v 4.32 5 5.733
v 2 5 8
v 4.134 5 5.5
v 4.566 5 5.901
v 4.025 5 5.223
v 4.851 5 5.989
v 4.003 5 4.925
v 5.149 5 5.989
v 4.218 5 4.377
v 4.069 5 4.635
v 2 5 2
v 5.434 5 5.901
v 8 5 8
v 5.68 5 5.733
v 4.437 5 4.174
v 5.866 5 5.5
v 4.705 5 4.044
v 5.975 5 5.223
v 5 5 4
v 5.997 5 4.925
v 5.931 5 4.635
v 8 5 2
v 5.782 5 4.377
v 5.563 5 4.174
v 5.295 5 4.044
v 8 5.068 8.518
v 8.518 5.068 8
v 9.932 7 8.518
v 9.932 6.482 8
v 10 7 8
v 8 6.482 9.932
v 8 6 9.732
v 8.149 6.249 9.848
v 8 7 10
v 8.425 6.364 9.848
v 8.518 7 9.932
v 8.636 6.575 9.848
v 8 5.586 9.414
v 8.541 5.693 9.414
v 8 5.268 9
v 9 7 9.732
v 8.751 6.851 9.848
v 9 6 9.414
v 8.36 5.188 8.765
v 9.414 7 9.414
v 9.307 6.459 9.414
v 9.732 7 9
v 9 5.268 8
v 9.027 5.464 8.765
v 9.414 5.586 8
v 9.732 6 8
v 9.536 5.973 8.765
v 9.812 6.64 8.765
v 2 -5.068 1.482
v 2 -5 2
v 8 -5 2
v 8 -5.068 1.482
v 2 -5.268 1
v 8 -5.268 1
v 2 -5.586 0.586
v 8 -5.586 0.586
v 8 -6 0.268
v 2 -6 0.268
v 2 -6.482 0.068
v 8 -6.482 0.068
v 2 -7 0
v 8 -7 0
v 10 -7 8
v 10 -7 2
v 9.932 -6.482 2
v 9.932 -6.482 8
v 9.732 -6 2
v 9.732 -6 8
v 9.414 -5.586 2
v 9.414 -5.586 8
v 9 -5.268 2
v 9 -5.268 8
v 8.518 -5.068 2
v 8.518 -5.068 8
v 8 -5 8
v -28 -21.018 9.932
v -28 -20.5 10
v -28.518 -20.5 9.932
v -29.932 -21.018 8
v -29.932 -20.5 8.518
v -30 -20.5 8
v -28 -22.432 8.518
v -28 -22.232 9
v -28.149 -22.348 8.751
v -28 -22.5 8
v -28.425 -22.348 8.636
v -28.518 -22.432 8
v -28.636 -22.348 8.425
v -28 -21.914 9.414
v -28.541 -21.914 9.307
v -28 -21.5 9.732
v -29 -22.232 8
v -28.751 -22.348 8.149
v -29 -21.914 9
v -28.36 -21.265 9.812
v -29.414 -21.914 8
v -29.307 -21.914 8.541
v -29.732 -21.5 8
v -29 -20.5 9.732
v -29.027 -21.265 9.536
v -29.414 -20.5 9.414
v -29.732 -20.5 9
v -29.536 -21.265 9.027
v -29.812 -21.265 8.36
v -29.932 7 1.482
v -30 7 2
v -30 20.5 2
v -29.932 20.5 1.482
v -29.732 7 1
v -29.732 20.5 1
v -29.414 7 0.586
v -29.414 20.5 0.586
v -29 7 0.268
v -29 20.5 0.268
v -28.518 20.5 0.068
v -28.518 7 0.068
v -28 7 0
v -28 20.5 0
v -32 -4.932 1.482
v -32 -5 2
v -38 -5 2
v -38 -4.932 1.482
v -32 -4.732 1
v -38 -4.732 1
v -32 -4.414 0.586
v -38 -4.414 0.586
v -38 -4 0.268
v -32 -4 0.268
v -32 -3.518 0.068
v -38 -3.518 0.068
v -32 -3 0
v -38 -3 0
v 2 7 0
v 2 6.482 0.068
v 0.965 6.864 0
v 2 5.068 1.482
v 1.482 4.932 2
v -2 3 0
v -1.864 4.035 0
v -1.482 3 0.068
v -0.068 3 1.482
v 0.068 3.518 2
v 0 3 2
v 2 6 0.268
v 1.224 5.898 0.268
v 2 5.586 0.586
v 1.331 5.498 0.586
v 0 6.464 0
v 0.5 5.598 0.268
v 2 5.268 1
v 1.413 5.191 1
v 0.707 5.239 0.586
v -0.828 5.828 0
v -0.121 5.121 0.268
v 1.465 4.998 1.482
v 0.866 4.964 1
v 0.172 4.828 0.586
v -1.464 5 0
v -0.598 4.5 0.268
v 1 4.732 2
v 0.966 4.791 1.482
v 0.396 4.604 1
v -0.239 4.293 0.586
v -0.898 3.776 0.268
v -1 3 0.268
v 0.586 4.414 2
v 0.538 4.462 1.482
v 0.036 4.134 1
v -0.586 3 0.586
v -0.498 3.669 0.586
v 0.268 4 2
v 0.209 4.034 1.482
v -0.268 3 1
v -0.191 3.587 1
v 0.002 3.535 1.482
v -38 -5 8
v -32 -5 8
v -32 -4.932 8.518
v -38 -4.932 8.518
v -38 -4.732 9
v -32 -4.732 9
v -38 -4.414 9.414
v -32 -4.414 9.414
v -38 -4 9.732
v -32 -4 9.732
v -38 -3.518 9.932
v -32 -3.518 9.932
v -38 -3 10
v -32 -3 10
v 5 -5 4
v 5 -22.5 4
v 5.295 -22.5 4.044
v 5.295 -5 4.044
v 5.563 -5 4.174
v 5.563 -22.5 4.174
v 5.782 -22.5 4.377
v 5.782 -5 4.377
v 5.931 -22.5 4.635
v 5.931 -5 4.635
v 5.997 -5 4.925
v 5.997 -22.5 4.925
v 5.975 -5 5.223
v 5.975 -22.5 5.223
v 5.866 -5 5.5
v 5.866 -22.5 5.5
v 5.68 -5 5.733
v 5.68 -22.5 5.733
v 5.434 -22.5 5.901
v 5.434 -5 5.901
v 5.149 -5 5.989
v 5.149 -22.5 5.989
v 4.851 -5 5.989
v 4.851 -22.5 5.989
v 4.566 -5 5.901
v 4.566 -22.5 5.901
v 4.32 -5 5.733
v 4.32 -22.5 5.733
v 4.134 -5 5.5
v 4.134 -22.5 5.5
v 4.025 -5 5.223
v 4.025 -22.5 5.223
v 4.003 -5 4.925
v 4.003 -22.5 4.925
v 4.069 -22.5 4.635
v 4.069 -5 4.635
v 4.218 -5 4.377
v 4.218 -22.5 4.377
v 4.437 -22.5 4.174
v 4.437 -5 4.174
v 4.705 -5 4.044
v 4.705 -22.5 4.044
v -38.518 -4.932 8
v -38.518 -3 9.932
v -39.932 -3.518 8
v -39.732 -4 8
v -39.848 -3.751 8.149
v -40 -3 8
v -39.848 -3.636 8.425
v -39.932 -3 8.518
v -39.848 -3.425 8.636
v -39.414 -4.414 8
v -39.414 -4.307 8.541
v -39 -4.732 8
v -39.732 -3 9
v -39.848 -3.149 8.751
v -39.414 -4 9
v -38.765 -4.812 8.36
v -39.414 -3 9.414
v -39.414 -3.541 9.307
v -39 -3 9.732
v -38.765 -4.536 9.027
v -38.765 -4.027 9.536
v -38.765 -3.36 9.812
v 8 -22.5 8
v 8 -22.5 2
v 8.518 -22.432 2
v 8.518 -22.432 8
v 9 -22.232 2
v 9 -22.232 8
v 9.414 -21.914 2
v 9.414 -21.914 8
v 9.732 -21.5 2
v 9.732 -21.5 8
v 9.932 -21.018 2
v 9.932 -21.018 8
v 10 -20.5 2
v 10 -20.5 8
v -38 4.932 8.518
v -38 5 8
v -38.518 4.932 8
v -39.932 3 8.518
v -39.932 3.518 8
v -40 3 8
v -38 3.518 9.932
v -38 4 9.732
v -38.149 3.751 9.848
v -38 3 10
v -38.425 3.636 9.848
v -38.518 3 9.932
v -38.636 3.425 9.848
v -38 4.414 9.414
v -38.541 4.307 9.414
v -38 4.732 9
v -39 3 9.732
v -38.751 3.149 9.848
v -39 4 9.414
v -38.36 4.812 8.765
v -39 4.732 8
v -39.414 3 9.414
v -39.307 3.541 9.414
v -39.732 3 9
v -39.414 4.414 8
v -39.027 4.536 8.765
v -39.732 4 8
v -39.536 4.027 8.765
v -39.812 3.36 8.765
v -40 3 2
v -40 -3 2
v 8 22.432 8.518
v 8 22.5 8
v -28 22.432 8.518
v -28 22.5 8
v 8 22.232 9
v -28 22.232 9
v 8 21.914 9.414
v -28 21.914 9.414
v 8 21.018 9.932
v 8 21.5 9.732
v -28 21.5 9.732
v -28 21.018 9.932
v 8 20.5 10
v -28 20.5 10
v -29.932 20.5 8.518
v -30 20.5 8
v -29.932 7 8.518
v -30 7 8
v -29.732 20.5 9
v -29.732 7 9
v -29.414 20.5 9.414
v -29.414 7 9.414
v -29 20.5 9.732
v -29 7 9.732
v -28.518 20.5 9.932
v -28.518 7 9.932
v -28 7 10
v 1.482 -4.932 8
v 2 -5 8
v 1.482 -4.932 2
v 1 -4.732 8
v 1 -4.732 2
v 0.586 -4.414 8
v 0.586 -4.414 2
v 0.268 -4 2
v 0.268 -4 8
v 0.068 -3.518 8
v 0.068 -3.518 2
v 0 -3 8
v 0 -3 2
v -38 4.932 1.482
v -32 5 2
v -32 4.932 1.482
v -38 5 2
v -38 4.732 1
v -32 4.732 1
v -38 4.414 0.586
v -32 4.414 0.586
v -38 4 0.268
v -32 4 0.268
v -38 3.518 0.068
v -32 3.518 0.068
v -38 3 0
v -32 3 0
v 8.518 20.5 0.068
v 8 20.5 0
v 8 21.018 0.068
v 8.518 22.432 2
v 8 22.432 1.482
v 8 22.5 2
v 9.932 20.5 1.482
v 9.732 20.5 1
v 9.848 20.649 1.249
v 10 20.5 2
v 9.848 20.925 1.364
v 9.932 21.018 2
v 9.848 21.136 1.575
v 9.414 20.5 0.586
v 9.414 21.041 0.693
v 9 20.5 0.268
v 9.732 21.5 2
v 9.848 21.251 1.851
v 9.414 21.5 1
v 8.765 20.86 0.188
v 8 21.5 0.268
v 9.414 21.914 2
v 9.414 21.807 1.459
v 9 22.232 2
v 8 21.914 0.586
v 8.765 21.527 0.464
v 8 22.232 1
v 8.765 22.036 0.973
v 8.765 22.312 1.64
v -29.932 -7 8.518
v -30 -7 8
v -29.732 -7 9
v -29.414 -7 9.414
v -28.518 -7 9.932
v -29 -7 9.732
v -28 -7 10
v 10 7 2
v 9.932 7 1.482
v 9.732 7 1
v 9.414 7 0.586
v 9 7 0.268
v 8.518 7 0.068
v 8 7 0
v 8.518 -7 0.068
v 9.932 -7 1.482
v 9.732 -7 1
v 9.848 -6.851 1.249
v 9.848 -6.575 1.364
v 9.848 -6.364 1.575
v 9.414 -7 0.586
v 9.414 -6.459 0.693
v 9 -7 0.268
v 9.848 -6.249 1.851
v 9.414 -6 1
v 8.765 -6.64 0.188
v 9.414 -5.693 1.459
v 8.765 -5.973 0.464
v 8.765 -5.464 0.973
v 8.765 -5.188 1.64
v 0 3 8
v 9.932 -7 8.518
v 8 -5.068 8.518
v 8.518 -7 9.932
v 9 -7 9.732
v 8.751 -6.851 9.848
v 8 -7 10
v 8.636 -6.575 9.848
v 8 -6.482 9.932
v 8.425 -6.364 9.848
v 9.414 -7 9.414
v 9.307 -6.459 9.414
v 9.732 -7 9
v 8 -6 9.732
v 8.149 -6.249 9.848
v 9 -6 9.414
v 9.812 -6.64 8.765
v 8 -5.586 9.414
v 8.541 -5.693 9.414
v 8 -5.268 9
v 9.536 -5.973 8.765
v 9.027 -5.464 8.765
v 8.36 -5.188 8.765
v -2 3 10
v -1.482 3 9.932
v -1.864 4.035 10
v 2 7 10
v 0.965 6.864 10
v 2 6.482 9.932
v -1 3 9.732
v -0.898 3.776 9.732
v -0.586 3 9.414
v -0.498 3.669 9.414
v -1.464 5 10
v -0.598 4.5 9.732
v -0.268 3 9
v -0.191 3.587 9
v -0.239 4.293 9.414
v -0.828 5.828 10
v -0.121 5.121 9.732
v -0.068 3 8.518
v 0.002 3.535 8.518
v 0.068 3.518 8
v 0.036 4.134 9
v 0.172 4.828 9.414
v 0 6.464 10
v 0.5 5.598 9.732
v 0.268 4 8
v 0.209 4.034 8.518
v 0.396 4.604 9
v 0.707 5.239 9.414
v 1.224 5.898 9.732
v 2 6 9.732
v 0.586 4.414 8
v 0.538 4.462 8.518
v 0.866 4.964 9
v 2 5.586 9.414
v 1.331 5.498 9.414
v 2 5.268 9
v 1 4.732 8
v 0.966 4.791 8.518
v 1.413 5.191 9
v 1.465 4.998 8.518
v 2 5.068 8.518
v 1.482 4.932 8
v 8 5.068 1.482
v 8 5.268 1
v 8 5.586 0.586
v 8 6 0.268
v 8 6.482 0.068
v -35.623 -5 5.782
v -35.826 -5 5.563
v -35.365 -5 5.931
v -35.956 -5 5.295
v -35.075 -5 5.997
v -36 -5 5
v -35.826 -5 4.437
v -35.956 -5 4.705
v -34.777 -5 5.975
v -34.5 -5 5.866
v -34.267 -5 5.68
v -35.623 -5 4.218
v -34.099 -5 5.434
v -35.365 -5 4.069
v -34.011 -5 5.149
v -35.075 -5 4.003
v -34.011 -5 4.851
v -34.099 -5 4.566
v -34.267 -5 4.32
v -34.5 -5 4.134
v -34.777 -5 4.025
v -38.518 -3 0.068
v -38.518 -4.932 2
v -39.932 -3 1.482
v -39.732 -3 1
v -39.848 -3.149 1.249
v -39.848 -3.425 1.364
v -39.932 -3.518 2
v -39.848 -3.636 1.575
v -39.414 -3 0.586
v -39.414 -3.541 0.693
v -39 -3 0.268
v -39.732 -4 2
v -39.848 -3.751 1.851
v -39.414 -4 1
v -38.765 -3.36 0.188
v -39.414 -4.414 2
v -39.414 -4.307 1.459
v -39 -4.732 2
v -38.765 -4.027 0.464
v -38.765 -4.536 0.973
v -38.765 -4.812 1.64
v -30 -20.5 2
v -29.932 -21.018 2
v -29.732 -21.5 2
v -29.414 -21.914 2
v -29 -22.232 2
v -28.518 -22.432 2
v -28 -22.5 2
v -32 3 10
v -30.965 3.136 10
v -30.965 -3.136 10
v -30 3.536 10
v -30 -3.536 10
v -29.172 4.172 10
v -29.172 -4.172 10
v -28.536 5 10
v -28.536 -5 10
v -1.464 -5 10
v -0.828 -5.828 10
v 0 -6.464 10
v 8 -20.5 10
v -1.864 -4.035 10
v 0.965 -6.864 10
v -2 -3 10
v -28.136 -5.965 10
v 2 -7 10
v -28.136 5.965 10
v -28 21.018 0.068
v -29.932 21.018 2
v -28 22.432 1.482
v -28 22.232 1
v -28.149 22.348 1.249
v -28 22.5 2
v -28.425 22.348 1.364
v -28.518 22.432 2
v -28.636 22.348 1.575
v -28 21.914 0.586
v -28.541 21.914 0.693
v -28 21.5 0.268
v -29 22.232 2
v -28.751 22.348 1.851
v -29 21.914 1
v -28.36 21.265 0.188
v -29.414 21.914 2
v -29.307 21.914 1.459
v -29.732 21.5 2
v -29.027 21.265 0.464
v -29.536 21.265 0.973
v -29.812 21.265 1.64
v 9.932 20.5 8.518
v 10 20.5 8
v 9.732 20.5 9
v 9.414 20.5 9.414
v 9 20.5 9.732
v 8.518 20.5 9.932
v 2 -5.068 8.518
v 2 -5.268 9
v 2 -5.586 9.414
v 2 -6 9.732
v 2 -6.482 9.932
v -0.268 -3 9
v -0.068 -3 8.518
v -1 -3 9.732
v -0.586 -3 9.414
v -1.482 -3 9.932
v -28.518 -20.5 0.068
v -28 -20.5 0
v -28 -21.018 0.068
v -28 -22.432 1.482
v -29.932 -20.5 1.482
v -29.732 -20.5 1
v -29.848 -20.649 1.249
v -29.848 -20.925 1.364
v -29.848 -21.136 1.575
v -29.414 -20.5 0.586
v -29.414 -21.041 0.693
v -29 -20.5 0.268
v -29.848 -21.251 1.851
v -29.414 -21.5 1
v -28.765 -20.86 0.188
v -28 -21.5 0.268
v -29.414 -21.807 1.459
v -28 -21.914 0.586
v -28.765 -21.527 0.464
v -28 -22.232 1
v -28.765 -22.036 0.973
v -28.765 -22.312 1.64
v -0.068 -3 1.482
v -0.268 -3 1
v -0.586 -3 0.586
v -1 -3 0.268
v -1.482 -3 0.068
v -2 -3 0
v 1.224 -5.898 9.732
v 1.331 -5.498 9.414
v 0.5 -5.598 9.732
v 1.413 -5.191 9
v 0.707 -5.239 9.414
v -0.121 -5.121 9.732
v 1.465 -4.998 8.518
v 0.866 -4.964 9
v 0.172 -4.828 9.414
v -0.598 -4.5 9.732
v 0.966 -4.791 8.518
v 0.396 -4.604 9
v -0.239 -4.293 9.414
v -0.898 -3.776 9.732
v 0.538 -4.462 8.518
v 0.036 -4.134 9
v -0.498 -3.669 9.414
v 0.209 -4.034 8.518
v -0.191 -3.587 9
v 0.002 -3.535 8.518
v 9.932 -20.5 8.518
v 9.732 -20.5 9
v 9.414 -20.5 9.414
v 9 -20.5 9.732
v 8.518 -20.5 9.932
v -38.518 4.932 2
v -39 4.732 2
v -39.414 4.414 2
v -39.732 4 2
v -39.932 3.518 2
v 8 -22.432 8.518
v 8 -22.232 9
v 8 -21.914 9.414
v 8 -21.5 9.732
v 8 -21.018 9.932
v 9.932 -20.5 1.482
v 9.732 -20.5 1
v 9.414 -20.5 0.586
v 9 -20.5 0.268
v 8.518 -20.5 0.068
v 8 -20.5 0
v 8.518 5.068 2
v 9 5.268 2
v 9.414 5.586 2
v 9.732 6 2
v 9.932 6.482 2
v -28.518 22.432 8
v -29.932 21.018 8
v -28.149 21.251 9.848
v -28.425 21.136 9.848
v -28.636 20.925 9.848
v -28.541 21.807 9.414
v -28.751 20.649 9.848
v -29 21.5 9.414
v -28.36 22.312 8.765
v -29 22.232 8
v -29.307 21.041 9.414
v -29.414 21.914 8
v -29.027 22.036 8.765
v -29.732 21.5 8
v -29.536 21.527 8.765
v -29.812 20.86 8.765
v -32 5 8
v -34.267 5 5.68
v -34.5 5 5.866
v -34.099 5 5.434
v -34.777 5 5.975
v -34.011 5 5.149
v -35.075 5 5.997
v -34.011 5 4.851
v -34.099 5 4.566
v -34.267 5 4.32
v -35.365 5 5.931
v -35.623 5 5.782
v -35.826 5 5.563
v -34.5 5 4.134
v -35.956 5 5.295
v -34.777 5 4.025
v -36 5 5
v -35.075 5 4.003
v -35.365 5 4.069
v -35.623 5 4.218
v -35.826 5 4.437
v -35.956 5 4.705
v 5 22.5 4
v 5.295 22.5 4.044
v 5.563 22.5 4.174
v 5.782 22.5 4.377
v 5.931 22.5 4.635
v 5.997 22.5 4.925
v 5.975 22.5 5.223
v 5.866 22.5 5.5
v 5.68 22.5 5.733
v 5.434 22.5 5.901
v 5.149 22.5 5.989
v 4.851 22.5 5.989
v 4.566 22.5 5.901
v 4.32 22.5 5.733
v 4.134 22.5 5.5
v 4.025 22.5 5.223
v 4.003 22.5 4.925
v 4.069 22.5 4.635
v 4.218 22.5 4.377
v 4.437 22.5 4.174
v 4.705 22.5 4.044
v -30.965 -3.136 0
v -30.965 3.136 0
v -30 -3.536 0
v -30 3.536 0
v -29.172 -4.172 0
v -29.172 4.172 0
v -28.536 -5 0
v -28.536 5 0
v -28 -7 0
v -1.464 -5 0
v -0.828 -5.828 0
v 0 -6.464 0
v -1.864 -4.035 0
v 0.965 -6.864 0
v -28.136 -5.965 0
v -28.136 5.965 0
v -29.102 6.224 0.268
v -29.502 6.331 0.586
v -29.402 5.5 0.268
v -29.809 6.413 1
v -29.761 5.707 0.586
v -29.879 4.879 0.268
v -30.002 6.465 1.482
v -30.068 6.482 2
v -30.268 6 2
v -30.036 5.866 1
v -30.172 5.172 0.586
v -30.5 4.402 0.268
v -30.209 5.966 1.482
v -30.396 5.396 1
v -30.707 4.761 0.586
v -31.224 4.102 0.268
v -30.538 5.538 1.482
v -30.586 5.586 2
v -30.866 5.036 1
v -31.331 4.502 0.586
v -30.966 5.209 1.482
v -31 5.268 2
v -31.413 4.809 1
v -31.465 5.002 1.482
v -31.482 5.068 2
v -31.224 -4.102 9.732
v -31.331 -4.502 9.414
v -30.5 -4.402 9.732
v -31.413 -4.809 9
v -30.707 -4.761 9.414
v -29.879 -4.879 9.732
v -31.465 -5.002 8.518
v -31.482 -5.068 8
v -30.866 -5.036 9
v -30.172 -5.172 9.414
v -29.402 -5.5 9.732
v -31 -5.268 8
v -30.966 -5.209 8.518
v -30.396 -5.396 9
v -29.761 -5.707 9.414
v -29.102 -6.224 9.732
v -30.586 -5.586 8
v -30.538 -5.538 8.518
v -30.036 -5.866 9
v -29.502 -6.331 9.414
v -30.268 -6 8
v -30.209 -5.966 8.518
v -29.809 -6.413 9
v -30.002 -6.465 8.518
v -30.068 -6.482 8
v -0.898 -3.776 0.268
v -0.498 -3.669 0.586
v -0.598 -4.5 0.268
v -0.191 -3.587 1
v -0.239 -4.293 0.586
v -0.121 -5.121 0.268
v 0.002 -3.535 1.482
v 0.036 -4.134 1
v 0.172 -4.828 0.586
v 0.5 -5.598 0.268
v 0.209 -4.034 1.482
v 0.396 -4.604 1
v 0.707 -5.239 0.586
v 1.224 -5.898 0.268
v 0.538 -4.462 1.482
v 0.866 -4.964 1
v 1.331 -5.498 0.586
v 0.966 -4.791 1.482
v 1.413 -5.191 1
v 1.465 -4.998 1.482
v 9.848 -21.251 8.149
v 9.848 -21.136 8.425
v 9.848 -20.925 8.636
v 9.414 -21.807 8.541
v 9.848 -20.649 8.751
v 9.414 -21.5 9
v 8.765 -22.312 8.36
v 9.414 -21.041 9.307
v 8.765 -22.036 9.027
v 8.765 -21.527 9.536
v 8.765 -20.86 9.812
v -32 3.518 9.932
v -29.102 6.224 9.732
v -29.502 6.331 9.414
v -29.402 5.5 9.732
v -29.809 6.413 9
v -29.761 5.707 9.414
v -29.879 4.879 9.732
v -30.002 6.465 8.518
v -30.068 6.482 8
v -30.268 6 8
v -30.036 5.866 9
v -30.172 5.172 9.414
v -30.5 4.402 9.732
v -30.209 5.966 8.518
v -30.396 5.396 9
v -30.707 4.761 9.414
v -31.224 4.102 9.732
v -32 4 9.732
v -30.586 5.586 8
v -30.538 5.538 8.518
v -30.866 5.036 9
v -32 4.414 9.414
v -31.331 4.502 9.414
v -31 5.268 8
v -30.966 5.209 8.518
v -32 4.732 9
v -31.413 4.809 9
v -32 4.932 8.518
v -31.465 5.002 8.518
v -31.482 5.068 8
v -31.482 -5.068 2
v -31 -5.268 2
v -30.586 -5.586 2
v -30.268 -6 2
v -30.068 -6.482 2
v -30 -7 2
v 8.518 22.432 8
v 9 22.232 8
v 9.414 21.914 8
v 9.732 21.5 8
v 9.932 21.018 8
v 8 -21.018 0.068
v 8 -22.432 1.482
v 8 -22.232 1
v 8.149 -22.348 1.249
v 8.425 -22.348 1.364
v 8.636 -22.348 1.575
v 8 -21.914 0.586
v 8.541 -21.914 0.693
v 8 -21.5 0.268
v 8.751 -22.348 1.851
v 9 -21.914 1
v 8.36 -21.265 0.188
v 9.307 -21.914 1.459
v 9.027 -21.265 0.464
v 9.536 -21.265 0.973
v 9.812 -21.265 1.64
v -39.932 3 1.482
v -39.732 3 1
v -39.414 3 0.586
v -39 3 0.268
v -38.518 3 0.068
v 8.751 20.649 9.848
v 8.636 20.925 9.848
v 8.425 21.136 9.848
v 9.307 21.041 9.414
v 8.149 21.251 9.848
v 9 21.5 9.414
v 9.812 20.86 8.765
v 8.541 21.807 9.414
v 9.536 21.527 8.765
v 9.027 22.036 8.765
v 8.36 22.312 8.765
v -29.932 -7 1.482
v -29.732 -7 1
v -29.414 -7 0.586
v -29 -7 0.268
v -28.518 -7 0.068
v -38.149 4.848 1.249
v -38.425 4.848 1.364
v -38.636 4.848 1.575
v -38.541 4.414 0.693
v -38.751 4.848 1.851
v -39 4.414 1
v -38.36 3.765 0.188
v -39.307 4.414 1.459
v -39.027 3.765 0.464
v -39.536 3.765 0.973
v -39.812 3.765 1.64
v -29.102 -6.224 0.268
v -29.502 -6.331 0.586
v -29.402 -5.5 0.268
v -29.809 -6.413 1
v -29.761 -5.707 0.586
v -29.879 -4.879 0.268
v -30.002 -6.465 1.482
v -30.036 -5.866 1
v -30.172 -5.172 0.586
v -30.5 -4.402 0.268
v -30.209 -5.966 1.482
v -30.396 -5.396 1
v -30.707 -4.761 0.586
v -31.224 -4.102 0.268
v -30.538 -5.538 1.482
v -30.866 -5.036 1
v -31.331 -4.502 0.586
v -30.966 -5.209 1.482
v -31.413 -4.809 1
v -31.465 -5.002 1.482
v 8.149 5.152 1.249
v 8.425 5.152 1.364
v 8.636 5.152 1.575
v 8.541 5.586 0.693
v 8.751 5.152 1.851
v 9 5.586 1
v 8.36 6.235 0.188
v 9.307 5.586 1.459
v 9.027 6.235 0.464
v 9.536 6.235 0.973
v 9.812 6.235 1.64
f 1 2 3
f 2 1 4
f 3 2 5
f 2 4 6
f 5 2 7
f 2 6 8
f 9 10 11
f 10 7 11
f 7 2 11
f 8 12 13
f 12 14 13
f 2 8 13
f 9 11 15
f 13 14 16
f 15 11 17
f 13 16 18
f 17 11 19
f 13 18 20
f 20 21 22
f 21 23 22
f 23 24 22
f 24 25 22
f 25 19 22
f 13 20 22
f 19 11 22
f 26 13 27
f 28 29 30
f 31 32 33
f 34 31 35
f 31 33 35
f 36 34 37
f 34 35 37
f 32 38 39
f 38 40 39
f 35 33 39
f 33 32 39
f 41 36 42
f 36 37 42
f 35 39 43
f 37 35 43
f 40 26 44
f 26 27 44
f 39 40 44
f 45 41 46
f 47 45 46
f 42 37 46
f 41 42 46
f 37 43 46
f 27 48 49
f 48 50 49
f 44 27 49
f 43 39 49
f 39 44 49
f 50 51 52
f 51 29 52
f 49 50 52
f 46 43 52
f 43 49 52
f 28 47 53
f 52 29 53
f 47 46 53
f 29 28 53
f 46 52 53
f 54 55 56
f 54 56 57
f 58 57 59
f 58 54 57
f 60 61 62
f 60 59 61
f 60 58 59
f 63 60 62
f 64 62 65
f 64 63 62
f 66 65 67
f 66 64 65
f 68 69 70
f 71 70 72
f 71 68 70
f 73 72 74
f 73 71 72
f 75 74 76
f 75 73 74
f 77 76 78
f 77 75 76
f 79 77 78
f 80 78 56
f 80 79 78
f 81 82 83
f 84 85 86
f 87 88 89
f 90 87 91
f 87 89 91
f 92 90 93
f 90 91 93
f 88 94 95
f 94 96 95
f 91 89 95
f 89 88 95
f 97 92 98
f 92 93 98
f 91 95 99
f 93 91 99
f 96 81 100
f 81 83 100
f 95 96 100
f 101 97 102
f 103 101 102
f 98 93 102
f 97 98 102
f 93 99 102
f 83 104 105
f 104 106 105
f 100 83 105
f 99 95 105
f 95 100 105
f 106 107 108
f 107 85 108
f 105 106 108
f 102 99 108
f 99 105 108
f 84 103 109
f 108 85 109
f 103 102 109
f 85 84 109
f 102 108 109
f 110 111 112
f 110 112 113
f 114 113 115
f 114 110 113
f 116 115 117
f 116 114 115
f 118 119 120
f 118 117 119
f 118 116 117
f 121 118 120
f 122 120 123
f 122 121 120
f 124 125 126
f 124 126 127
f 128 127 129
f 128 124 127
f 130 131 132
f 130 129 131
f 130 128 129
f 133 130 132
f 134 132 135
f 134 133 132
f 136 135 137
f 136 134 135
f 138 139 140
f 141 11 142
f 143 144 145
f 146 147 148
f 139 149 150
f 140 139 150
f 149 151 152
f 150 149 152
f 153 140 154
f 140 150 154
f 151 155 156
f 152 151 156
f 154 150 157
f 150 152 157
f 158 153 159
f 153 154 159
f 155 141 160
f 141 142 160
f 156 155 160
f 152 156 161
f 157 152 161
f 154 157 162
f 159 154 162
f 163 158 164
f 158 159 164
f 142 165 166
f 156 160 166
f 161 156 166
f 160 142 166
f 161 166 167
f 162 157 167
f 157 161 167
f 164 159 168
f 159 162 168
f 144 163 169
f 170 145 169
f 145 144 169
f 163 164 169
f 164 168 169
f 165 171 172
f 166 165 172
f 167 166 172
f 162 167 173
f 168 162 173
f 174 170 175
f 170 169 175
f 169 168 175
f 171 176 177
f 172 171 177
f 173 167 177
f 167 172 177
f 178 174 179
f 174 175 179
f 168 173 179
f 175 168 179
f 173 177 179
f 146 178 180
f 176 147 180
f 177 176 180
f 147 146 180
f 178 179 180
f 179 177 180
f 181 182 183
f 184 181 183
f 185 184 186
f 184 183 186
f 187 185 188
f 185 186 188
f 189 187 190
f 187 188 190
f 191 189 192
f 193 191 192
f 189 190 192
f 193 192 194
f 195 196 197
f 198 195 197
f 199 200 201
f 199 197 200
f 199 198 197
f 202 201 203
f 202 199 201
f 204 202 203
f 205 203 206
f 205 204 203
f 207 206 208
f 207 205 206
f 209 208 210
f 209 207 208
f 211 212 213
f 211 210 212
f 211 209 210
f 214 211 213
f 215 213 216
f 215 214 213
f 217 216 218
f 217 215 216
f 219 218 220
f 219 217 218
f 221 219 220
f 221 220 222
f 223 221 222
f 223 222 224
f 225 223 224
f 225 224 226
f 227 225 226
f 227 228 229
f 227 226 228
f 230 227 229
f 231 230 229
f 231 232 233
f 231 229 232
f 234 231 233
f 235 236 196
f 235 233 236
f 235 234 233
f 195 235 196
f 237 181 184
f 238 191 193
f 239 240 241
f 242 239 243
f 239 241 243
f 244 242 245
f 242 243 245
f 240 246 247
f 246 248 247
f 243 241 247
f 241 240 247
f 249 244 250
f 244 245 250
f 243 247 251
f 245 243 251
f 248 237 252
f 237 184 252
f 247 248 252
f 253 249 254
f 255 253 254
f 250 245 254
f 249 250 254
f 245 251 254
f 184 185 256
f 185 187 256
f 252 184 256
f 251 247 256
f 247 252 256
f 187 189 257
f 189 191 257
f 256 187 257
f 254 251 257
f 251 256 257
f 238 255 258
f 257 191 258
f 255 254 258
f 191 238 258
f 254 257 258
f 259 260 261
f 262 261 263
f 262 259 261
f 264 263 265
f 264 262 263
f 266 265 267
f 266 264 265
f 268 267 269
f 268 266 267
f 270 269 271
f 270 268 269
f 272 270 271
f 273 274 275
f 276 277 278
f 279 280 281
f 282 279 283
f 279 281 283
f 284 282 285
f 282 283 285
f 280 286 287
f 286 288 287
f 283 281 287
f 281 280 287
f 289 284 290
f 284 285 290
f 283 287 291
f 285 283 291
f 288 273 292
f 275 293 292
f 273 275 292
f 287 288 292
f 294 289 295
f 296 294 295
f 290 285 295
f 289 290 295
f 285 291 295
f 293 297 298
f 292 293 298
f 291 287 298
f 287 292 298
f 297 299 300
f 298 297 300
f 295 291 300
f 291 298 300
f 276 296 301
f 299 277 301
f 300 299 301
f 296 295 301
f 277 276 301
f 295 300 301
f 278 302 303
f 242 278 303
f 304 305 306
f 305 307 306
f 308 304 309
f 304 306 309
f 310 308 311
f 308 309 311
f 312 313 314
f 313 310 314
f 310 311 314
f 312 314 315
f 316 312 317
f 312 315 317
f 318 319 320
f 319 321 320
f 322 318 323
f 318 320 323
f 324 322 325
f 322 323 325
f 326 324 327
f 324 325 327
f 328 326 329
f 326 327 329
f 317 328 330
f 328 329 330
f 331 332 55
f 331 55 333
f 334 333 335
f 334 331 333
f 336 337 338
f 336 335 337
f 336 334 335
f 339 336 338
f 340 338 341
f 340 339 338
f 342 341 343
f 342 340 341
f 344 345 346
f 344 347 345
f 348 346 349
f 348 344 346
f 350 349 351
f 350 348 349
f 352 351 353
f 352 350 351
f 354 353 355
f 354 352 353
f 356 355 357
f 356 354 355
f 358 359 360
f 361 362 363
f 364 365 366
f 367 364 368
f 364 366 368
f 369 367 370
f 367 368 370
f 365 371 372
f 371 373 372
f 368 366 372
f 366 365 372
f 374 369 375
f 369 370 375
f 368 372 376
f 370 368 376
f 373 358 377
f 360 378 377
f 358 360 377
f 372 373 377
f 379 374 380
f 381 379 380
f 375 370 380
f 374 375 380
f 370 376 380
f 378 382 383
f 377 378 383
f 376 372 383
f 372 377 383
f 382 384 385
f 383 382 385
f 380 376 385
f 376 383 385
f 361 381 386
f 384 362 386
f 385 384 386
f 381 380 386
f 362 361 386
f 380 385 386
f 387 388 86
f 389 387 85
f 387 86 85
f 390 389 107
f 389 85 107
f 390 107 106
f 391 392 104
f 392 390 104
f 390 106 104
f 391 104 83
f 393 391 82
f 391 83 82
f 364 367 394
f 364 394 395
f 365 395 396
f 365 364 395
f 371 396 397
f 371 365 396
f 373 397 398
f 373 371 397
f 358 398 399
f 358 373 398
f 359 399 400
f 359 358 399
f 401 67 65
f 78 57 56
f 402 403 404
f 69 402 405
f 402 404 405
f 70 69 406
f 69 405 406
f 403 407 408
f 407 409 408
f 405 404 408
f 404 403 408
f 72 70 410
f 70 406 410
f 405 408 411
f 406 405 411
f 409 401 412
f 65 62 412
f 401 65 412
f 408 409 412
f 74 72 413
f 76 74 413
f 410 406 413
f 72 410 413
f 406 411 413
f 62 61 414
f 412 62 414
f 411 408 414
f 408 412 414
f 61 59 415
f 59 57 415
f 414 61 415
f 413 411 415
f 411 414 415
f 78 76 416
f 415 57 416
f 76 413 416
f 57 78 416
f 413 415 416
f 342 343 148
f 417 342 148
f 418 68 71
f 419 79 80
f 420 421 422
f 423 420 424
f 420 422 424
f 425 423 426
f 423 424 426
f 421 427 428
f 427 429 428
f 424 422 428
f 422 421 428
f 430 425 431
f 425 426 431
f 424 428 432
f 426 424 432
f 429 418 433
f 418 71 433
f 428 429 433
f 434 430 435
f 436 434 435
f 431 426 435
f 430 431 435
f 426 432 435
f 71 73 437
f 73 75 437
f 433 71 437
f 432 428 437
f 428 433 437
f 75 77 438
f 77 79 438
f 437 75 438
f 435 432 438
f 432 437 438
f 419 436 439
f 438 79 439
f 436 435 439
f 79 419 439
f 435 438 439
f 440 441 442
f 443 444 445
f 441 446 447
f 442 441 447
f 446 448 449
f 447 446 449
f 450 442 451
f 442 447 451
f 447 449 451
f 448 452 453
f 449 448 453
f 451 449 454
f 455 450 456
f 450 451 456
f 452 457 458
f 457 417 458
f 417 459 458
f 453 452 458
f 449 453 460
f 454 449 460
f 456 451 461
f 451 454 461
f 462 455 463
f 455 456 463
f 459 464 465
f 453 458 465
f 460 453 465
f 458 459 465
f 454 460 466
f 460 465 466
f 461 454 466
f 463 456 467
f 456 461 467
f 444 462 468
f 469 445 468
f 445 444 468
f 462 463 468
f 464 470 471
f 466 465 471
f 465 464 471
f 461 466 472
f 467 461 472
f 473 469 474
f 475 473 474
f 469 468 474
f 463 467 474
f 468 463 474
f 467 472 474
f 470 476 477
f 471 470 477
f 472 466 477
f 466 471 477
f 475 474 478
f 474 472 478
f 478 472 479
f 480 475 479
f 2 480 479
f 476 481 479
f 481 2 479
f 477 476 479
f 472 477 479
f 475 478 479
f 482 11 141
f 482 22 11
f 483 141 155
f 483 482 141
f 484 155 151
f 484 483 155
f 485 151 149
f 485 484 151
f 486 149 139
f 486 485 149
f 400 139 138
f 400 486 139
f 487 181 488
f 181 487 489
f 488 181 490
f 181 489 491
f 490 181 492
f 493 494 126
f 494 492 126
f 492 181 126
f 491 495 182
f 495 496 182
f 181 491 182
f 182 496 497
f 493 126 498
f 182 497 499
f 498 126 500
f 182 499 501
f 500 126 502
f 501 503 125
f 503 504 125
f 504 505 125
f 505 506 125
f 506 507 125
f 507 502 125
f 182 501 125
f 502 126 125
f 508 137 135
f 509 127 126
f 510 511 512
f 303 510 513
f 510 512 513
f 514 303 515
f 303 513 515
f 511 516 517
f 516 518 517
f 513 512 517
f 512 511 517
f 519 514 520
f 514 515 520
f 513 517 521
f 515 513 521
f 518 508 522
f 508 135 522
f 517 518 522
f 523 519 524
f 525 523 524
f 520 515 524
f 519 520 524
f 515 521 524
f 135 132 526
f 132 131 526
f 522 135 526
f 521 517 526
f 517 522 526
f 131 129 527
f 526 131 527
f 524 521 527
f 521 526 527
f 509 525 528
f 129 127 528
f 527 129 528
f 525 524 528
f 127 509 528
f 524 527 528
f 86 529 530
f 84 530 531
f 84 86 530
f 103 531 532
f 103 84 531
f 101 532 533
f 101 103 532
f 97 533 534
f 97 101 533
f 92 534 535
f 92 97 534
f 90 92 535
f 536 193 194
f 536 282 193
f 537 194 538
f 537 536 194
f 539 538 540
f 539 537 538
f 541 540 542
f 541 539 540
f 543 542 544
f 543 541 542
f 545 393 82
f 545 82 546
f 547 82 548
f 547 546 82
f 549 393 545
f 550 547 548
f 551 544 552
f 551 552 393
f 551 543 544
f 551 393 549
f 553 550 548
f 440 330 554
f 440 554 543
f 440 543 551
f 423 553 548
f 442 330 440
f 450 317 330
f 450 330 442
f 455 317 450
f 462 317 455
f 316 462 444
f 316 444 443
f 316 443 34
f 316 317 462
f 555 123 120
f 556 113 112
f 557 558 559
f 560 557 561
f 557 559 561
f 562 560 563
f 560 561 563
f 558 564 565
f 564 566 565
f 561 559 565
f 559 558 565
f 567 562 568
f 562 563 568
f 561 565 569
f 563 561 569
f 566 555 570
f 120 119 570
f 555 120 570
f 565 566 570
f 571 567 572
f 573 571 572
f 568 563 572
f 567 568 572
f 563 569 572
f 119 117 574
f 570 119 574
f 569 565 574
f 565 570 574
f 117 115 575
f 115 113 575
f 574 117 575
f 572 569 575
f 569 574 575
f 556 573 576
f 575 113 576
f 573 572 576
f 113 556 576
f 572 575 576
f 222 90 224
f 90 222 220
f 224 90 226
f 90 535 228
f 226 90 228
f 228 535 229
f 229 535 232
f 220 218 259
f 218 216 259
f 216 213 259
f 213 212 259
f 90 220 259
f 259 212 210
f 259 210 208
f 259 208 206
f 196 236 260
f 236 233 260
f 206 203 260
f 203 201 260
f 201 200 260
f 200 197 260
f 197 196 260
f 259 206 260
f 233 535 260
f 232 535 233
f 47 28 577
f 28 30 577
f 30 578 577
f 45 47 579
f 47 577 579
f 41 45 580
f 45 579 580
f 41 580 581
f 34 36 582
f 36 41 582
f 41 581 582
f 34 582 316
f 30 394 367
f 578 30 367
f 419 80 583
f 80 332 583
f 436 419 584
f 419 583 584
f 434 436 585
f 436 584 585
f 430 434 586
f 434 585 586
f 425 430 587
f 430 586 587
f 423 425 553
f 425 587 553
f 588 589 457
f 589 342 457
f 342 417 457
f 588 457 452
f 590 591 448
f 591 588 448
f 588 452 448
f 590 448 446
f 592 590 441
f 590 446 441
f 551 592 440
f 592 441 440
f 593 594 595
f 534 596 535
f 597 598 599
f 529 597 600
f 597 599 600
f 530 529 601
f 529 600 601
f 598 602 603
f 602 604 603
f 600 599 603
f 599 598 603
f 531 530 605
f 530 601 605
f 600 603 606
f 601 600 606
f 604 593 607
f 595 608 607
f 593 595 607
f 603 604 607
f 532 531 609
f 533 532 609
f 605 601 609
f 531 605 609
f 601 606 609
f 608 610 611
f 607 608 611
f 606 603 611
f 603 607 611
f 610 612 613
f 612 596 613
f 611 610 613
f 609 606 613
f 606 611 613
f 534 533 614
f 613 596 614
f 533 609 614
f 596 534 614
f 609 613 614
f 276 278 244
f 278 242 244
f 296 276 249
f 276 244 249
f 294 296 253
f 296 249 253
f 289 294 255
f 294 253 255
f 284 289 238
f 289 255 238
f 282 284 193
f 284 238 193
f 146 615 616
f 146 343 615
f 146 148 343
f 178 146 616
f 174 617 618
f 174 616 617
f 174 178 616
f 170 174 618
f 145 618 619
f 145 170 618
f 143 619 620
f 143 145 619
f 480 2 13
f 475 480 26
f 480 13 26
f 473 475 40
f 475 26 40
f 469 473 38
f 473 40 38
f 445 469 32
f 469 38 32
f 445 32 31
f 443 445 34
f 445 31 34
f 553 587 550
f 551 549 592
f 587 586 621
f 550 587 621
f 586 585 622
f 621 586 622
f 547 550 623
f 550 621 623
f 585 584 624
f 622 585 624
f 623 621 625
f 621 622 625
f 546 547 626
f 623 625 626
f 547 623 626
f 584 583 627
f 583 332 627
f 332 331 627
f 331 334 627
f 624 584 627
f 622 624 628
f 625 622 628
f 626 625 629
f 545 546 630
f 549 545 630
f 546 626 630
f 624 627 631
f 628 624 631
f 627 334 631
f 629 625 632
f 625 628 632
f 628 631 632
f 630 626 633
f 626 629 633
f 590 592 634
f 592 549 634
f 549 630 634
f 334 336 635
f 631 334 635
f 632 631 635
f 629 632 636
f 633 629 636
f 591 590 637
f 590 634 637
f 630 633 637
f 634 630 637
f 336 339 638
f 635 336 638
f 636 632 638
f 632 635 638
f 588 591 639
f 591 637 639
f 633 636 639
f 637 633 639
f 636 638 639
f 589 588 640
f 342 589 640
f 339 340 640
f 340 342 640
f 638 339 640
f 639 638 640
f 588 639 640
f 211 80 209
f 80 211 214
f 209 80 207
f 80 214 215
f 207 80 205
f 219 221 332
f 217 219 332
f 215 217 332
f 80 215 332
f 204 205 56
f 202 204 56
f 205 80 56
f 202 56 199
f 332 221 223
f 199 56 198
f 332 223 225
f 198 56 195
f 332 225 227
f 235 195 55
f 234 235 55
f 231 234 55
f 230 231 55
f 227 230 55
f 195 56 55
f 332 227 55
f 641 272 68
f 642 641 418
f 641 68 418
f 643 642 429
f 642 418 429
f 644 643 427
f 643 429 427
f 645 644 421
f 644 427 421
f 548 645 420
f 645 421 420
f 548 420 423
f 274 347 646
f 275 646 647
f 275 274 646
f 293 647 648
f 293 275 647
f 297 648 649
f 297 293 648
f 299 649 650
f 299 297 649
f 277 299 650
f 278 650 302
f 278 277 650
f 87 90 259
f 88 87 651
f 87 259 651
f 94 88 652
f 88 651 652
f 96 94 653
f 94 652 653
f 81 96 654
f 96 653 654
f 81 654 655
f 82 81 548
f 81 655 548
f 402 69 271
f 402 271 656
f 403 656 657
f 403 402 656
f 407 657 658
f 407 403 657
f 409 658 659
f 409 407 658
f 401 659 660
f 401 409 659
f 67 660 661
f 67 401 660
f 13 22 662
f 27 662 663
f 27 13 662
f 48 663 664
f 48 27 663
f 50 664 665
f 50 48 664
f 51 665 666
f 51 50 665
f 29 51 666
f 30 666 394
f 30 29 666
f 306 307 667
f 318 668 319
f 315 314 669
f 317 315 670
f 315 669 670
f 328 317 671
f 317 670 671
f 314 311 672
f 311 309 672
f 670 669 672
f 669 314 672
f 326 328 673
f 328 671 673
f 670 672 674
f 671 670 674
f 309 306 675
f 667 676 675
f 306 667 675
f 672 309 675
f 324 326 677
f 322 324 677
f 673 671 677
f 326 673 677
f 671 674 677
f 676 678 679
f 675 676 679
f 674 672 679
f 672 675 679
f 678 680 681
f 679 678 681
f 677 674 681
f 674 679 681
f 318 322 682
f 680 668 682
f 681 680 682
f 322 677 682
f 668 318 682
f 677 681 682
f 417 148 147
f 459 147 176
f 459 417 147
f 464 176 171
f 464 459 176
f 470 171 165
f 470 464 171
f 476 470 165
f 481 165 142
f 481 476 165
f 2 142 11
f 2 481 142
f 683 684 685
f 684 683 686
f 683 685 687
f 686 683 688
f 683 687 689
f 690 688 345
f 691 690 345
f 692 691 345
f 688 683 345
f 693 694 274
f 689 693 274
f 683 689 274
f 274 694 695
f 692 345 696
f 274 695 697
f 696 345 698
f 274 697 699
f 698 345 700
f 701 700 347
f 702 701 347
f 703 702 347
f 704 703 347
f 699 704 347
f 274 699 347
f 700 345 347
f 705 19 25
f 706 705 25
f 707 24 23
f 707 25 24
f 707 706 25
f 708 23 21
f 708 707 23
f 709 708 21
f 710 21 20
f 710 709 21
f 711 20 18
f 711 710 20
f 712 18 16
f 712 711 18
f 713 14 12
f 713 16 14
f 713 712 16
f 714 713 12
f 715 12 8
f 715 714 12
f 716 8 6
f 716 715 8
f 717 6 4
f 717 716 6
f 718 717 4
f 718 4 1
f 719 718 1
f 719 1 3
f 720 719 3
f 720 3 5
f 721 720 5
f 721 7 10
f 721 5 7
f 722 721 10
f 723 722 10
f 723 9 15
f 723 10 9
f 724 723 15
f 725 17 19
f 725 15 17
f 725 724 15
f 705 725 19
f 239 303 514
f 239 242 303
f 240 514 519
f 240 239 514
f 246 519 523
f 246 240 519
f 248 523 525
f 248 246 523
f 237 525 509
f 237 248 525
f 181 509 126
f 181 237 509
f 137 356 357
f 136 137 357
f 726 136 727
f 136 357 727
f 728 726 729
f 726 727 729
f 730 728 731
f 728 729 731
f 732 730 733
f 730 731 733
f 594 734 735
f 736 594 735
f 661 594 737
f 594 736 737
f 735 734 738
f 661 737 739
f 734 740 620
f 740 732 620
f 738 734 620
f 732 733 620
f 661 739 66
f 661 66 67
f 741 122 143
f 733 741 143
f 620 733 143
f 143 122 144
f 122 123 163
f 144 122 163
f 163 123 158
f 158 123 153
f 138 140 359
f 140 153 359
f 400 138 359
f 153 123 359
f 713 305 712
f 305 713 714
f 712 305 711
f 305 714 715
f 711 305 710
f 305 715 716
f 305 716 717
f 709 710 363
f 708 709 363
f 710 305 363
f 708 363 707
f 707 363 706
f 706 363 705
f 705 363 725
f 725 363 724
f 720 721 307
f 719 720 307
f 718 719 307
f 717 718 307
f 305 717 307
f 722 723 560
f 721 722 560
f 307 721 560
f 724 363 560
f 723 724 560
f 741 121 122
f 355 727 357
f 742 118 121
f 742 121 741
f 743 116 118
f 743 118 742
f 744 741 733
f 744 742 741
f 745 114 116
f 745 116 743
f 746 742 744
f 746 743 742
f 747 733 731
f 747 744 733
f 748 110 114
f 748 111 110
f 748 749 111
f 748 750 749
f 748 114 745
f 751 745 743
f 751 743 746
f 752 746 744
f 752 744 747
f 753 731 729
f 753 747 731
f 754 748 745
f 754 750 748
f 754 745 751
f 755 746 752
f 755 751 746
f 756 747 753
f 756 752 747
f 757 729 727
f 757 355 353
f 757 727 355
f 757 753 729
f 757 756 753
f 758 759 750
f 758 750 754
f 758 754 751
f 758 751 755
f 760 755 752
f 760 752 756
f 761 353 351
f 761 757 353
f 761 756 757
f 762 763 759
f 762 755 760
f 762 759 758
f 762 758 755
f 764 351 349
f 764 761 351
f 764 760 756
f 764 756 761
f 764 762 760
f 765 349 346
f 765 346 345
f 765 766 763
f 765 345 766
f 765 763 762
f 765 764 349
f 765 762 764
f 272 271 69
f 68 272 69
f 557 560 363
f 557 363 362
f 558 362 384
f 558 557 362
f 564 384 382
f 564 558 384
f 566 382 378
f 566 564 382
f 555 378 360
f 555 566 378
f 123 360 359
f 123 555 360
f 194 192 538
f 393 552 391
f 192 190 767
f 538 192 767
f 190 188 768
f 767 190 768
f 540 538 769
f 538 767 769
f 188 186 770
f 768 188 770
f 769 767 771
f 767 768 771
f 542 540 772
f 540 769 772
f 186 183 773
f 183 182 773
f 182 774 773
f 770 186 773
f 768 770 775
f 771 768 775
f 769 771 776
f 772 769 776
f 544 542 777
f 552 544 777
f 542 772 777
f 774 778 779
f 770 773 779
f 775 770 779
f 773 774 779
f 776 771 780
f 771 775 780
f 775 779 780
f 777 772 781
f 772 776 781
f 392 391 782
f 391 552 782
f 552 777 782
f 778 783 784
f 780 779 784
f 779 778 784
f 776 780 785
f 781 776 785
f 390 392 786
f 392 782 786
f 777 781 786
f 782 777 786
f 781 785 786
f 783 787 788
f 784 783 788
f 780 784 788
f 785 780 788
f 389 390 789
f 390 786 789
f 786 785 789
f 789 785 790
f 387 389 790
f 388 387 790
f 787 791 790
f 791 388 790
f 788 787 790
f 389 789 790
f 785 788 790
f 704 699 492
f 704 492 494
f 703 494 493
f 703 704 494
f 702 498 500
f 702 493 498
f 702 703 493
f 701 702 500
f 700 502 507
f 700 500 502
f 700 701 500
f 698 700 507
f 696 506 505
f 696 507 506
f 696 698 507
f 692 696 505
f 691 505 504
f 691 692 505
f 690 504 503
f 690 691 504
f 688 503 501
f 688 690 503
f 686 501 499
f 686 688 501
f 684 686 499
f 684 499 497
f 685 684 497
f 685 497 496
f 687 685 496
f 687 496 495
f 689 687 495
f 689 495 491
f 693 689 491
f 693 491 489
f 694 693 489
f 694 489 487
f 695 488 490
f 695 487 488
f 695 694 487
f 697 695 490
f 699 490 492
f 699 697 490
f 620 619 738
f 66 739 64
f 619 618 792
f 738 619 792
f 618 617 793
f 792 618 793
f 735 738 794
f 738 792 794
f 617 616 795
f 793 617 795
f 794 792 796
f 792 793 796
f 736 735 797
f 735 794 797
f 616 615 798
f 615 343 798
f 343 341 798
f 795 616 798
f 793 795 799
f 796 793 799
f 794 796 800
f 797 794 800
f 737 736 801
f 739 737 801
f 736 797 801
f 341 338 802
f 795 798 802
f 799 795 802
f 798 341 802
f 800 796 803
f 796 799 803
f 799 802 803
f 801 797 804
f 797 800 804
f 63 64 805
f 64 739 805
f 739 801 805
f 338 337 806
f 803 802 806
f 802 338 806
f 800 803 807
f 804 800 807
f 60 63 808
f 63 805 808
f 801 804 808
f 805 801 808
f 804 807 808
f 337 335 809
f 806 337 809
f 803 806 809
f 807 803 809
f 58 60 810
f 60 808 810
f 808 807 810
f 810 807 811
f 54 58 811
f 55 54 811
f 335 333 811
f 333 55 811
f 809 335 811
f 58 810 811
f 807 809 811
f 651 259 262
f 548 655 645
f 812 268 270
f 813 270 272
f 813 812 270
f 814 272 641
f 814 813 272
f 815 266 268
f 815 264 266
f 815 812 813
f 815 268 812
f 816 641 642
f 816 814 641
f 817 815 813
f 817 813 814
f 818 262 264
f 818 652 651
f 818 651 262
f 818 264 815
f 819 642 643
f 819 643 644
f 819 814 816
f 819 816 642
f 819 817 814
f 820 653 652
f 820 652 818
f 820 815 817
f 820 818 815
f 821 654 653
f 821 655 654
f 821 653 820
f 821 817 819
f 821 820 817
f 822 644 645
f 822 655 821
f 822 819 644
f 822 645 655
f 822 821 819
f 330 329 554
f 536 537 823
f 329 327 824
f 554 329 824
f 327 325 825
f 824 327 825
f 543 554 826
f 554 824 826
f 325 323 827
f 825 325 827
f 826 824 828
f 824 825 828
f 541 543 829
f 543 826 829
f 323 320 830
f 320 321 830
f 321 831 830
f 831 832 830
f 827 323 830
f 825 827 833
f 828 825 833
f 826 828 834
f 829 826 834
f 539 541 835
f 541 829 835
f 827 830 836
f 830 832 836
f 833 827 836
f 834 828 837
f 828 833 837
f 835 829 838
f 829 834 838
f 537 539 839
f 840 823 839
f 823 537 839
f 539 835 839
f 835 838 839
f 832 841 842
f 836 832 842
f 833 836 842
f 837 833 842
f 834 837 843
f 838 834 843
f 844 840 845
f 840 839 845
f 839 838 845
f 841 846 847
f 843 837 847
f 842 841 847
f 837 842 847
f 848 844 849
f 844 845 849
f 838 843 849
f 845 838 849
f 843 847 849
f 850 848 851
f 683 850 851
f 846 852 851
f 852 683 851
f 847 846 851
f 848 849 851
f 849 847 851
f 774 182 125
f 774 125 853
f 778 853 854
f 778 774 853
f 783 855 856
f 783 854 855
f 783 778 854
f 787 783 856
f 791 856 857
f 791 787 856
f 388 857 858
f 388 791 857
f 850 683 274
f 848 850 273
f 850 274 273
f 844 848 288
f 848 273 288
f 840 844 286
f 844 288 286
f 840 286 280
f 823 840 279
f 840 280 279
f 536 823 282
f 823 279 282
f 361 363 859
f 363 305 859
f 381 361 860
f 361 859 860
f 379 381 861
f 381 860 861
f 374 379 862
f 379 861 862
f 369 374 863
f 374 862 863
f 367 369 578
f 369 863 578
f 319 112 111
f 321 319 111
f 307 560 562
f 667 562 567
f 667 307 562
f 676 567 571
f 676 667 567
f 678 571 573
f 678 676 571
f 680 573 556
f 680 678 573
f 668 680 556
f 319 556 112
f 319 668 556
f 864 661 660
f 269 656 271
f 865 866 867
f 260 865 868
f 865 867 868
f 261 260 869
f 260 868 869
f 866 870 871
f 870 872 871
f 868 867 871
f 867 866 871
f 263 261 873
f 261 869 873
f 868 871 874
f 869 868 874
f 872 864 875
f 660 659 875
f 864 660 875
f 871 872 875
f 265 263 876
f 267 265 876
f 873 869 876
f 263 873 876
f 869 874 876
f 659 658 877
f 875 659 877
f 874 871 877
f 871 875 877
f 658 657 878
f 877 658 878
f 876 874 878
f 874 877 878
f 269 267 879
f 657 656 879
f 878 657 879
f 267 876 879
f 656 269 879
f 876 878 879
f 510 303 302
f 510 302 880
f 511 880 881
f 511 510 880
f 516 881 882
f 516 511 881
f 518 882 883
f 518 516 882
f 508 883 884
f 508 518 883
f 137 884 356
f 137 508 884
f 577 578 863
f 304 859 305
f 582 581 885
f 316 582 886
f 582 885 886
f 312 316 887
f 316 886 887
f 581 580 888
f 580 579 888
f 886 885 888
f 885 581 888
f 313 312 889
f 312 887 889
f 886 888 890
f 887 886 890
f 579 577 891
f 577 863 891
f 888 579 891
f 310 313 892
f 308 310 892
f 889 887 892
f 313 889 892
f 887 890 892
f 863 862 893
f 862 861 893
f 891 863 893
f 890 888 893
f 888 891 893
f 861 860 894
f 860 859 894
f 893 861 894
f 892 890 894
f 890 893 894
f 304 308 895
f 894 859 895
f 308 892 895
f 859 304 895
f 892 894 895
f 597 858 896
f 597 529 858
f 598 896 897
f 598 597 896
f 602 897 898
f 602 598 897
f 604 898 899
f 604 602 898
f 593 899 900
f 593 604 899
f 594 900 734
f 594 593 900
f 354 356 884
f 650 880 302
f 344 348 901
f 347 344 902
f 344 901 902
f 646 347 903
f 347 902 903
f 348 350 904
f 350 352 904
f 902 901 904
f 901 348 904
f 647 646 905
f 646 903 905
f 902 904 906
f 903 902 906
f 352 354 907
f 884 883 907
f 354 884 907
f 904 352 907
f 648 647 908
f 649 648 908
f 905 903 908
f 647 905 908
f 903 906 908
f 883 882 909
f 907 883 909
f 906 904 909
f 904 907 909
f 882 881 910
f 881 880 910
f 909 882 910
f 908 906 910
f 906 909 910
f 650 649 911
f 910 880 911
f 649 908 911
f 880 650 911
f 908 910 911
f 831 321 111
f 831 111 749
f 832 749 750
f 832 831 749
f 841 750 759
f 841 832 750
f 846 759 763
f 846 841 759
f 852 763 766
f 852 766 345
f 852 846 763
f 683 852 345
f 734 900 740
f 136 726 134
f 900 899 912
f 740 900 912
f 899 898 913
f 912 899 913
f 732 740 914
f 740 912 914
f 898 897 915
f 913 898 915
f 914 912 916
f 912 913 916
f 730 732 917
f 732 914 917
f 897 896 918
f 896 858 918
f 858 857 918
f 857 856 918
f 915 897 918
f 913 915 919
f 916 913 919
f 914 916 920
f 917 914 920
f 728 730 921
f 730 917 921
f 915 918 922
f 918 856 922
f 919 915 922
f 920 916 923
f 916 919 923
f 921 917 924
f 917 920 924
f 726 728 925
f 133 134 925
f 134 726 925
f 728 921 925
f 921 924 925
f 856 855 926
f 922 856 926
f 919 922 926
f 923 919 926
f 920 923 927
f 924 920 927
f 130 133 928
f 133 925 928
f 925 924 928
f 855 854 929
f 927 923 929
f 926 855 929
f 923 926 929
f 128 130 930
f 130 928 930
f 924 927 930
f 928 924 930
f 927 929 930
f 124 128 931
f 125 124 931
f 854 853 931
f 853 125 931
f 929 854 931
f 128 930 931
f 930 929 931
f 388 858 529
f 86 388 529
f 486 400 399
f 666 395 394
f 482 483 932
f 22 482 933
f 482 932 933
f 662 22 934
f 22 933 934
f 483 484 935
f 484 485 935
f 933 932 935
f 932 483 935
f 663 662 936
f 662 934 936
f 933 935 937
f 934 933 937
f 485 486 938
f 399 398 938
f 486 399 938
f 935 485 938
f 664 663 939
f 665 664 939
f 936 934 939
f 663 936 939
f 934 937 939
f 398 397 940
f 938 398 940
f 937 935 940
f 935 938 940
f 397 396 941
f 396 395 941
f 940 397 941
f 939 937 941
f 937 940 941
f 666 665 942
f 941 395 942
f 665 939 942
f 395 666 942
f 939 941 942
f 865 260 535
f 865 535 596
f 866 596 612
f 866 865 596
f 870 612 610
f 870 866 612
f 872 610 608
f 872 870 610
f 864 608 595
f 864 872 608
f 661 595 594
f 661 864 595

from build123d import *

# Parameters (mm, degrees)
BOSS_EXTRUDE1_DEPTH     = 10
FILLET1_R               = 2
CUT_EXTRUDE1_DEPTH      = 50.560569004
CUT_EXTRUDE1_DEPTH_BACK = 50.560569004
SKETCH2_R               = 1


with BuildPart() as part:
    # Sketch1 → Boss-Extrude1 (new body)
    with BuildSketch(Plane.XY):
        Polygon((10, 22.5), (-30, 22.5), (-30, 5), (-40, 5), (-40, -5), (-30, -5), (-30, -22.5), (10, -22.5), (10, -5), (0, -5), (0, 5), (10, 5), align=None)
    extrude(amount=BOSS_EXTRUDE1_DEPTH)

    # Fillet1
    fillet1_edges = [part.edges().sort_by_distance(p)[0] for p in [
        (-30, 13.75, 0),
        (-10, 22.5, 0),
        (-35, -5, 10),
        (10, 13.75, 0),
        (5, 5, 0),
        (0, 0, 0),
        (5, -5, 0),
        (10, -13.75, 0),
        (-10, -22.5, 0),
        (-30, -13.75, 0),
        (-35, -5, 0),
        (-40, 0, 0),
        (-35, 5, 0),
        (-30, -13.75, 10),
        (-30, 5, 5),
        (-30, 22.5, 5),
        (10, 22.5, 5),
        (-10, -22.5, 10),
        (10, 5, 5),
        (0, 5, 5),
        (0, -5, 5),
        (10, -5, 5),
        (10, -22.5, 5),
        (-30, -22.5, 5),
        (-30, -5, 5),
        (-40, -5, 5),
        (-40, 5, 5),
        (10, -13.75, 10),
        (5, -5, 10),
        (0, 0, 10),
        (5, 5, 10),
        (10, 13.75, 10),
        (-10, 22.5, 10),
        (-30, 13.75, 10),
        (-35, 5, 10),
        (-40, 0, 10),
    ]]
    fillet(fillet1_edges, radius=FILLET1_R)

    # Sketch2 → Cut-Extrude1 (cut, two sides: drawn at the far end of the back side and taken through both)
    with BuildSketch(Plane.XZ.offset(-5).offset(-CUT_EXTRUDE1_DEPTH_BACK)):
        with Locations(Location((5, 5, 0), (0, 0, 270))):
            Circle(SKETCH2_R)
        with Locations(Location((-35, 5, 0), (0, 0, 180))):
            Circle(SKETCH2_R)
    extrude(amount=CUT_EXTRUDE1_DEPTH + CUT_EXTRUDE1_DEPTH_BACK, mode=Mode.SUBTRACT)


solid = part.part
